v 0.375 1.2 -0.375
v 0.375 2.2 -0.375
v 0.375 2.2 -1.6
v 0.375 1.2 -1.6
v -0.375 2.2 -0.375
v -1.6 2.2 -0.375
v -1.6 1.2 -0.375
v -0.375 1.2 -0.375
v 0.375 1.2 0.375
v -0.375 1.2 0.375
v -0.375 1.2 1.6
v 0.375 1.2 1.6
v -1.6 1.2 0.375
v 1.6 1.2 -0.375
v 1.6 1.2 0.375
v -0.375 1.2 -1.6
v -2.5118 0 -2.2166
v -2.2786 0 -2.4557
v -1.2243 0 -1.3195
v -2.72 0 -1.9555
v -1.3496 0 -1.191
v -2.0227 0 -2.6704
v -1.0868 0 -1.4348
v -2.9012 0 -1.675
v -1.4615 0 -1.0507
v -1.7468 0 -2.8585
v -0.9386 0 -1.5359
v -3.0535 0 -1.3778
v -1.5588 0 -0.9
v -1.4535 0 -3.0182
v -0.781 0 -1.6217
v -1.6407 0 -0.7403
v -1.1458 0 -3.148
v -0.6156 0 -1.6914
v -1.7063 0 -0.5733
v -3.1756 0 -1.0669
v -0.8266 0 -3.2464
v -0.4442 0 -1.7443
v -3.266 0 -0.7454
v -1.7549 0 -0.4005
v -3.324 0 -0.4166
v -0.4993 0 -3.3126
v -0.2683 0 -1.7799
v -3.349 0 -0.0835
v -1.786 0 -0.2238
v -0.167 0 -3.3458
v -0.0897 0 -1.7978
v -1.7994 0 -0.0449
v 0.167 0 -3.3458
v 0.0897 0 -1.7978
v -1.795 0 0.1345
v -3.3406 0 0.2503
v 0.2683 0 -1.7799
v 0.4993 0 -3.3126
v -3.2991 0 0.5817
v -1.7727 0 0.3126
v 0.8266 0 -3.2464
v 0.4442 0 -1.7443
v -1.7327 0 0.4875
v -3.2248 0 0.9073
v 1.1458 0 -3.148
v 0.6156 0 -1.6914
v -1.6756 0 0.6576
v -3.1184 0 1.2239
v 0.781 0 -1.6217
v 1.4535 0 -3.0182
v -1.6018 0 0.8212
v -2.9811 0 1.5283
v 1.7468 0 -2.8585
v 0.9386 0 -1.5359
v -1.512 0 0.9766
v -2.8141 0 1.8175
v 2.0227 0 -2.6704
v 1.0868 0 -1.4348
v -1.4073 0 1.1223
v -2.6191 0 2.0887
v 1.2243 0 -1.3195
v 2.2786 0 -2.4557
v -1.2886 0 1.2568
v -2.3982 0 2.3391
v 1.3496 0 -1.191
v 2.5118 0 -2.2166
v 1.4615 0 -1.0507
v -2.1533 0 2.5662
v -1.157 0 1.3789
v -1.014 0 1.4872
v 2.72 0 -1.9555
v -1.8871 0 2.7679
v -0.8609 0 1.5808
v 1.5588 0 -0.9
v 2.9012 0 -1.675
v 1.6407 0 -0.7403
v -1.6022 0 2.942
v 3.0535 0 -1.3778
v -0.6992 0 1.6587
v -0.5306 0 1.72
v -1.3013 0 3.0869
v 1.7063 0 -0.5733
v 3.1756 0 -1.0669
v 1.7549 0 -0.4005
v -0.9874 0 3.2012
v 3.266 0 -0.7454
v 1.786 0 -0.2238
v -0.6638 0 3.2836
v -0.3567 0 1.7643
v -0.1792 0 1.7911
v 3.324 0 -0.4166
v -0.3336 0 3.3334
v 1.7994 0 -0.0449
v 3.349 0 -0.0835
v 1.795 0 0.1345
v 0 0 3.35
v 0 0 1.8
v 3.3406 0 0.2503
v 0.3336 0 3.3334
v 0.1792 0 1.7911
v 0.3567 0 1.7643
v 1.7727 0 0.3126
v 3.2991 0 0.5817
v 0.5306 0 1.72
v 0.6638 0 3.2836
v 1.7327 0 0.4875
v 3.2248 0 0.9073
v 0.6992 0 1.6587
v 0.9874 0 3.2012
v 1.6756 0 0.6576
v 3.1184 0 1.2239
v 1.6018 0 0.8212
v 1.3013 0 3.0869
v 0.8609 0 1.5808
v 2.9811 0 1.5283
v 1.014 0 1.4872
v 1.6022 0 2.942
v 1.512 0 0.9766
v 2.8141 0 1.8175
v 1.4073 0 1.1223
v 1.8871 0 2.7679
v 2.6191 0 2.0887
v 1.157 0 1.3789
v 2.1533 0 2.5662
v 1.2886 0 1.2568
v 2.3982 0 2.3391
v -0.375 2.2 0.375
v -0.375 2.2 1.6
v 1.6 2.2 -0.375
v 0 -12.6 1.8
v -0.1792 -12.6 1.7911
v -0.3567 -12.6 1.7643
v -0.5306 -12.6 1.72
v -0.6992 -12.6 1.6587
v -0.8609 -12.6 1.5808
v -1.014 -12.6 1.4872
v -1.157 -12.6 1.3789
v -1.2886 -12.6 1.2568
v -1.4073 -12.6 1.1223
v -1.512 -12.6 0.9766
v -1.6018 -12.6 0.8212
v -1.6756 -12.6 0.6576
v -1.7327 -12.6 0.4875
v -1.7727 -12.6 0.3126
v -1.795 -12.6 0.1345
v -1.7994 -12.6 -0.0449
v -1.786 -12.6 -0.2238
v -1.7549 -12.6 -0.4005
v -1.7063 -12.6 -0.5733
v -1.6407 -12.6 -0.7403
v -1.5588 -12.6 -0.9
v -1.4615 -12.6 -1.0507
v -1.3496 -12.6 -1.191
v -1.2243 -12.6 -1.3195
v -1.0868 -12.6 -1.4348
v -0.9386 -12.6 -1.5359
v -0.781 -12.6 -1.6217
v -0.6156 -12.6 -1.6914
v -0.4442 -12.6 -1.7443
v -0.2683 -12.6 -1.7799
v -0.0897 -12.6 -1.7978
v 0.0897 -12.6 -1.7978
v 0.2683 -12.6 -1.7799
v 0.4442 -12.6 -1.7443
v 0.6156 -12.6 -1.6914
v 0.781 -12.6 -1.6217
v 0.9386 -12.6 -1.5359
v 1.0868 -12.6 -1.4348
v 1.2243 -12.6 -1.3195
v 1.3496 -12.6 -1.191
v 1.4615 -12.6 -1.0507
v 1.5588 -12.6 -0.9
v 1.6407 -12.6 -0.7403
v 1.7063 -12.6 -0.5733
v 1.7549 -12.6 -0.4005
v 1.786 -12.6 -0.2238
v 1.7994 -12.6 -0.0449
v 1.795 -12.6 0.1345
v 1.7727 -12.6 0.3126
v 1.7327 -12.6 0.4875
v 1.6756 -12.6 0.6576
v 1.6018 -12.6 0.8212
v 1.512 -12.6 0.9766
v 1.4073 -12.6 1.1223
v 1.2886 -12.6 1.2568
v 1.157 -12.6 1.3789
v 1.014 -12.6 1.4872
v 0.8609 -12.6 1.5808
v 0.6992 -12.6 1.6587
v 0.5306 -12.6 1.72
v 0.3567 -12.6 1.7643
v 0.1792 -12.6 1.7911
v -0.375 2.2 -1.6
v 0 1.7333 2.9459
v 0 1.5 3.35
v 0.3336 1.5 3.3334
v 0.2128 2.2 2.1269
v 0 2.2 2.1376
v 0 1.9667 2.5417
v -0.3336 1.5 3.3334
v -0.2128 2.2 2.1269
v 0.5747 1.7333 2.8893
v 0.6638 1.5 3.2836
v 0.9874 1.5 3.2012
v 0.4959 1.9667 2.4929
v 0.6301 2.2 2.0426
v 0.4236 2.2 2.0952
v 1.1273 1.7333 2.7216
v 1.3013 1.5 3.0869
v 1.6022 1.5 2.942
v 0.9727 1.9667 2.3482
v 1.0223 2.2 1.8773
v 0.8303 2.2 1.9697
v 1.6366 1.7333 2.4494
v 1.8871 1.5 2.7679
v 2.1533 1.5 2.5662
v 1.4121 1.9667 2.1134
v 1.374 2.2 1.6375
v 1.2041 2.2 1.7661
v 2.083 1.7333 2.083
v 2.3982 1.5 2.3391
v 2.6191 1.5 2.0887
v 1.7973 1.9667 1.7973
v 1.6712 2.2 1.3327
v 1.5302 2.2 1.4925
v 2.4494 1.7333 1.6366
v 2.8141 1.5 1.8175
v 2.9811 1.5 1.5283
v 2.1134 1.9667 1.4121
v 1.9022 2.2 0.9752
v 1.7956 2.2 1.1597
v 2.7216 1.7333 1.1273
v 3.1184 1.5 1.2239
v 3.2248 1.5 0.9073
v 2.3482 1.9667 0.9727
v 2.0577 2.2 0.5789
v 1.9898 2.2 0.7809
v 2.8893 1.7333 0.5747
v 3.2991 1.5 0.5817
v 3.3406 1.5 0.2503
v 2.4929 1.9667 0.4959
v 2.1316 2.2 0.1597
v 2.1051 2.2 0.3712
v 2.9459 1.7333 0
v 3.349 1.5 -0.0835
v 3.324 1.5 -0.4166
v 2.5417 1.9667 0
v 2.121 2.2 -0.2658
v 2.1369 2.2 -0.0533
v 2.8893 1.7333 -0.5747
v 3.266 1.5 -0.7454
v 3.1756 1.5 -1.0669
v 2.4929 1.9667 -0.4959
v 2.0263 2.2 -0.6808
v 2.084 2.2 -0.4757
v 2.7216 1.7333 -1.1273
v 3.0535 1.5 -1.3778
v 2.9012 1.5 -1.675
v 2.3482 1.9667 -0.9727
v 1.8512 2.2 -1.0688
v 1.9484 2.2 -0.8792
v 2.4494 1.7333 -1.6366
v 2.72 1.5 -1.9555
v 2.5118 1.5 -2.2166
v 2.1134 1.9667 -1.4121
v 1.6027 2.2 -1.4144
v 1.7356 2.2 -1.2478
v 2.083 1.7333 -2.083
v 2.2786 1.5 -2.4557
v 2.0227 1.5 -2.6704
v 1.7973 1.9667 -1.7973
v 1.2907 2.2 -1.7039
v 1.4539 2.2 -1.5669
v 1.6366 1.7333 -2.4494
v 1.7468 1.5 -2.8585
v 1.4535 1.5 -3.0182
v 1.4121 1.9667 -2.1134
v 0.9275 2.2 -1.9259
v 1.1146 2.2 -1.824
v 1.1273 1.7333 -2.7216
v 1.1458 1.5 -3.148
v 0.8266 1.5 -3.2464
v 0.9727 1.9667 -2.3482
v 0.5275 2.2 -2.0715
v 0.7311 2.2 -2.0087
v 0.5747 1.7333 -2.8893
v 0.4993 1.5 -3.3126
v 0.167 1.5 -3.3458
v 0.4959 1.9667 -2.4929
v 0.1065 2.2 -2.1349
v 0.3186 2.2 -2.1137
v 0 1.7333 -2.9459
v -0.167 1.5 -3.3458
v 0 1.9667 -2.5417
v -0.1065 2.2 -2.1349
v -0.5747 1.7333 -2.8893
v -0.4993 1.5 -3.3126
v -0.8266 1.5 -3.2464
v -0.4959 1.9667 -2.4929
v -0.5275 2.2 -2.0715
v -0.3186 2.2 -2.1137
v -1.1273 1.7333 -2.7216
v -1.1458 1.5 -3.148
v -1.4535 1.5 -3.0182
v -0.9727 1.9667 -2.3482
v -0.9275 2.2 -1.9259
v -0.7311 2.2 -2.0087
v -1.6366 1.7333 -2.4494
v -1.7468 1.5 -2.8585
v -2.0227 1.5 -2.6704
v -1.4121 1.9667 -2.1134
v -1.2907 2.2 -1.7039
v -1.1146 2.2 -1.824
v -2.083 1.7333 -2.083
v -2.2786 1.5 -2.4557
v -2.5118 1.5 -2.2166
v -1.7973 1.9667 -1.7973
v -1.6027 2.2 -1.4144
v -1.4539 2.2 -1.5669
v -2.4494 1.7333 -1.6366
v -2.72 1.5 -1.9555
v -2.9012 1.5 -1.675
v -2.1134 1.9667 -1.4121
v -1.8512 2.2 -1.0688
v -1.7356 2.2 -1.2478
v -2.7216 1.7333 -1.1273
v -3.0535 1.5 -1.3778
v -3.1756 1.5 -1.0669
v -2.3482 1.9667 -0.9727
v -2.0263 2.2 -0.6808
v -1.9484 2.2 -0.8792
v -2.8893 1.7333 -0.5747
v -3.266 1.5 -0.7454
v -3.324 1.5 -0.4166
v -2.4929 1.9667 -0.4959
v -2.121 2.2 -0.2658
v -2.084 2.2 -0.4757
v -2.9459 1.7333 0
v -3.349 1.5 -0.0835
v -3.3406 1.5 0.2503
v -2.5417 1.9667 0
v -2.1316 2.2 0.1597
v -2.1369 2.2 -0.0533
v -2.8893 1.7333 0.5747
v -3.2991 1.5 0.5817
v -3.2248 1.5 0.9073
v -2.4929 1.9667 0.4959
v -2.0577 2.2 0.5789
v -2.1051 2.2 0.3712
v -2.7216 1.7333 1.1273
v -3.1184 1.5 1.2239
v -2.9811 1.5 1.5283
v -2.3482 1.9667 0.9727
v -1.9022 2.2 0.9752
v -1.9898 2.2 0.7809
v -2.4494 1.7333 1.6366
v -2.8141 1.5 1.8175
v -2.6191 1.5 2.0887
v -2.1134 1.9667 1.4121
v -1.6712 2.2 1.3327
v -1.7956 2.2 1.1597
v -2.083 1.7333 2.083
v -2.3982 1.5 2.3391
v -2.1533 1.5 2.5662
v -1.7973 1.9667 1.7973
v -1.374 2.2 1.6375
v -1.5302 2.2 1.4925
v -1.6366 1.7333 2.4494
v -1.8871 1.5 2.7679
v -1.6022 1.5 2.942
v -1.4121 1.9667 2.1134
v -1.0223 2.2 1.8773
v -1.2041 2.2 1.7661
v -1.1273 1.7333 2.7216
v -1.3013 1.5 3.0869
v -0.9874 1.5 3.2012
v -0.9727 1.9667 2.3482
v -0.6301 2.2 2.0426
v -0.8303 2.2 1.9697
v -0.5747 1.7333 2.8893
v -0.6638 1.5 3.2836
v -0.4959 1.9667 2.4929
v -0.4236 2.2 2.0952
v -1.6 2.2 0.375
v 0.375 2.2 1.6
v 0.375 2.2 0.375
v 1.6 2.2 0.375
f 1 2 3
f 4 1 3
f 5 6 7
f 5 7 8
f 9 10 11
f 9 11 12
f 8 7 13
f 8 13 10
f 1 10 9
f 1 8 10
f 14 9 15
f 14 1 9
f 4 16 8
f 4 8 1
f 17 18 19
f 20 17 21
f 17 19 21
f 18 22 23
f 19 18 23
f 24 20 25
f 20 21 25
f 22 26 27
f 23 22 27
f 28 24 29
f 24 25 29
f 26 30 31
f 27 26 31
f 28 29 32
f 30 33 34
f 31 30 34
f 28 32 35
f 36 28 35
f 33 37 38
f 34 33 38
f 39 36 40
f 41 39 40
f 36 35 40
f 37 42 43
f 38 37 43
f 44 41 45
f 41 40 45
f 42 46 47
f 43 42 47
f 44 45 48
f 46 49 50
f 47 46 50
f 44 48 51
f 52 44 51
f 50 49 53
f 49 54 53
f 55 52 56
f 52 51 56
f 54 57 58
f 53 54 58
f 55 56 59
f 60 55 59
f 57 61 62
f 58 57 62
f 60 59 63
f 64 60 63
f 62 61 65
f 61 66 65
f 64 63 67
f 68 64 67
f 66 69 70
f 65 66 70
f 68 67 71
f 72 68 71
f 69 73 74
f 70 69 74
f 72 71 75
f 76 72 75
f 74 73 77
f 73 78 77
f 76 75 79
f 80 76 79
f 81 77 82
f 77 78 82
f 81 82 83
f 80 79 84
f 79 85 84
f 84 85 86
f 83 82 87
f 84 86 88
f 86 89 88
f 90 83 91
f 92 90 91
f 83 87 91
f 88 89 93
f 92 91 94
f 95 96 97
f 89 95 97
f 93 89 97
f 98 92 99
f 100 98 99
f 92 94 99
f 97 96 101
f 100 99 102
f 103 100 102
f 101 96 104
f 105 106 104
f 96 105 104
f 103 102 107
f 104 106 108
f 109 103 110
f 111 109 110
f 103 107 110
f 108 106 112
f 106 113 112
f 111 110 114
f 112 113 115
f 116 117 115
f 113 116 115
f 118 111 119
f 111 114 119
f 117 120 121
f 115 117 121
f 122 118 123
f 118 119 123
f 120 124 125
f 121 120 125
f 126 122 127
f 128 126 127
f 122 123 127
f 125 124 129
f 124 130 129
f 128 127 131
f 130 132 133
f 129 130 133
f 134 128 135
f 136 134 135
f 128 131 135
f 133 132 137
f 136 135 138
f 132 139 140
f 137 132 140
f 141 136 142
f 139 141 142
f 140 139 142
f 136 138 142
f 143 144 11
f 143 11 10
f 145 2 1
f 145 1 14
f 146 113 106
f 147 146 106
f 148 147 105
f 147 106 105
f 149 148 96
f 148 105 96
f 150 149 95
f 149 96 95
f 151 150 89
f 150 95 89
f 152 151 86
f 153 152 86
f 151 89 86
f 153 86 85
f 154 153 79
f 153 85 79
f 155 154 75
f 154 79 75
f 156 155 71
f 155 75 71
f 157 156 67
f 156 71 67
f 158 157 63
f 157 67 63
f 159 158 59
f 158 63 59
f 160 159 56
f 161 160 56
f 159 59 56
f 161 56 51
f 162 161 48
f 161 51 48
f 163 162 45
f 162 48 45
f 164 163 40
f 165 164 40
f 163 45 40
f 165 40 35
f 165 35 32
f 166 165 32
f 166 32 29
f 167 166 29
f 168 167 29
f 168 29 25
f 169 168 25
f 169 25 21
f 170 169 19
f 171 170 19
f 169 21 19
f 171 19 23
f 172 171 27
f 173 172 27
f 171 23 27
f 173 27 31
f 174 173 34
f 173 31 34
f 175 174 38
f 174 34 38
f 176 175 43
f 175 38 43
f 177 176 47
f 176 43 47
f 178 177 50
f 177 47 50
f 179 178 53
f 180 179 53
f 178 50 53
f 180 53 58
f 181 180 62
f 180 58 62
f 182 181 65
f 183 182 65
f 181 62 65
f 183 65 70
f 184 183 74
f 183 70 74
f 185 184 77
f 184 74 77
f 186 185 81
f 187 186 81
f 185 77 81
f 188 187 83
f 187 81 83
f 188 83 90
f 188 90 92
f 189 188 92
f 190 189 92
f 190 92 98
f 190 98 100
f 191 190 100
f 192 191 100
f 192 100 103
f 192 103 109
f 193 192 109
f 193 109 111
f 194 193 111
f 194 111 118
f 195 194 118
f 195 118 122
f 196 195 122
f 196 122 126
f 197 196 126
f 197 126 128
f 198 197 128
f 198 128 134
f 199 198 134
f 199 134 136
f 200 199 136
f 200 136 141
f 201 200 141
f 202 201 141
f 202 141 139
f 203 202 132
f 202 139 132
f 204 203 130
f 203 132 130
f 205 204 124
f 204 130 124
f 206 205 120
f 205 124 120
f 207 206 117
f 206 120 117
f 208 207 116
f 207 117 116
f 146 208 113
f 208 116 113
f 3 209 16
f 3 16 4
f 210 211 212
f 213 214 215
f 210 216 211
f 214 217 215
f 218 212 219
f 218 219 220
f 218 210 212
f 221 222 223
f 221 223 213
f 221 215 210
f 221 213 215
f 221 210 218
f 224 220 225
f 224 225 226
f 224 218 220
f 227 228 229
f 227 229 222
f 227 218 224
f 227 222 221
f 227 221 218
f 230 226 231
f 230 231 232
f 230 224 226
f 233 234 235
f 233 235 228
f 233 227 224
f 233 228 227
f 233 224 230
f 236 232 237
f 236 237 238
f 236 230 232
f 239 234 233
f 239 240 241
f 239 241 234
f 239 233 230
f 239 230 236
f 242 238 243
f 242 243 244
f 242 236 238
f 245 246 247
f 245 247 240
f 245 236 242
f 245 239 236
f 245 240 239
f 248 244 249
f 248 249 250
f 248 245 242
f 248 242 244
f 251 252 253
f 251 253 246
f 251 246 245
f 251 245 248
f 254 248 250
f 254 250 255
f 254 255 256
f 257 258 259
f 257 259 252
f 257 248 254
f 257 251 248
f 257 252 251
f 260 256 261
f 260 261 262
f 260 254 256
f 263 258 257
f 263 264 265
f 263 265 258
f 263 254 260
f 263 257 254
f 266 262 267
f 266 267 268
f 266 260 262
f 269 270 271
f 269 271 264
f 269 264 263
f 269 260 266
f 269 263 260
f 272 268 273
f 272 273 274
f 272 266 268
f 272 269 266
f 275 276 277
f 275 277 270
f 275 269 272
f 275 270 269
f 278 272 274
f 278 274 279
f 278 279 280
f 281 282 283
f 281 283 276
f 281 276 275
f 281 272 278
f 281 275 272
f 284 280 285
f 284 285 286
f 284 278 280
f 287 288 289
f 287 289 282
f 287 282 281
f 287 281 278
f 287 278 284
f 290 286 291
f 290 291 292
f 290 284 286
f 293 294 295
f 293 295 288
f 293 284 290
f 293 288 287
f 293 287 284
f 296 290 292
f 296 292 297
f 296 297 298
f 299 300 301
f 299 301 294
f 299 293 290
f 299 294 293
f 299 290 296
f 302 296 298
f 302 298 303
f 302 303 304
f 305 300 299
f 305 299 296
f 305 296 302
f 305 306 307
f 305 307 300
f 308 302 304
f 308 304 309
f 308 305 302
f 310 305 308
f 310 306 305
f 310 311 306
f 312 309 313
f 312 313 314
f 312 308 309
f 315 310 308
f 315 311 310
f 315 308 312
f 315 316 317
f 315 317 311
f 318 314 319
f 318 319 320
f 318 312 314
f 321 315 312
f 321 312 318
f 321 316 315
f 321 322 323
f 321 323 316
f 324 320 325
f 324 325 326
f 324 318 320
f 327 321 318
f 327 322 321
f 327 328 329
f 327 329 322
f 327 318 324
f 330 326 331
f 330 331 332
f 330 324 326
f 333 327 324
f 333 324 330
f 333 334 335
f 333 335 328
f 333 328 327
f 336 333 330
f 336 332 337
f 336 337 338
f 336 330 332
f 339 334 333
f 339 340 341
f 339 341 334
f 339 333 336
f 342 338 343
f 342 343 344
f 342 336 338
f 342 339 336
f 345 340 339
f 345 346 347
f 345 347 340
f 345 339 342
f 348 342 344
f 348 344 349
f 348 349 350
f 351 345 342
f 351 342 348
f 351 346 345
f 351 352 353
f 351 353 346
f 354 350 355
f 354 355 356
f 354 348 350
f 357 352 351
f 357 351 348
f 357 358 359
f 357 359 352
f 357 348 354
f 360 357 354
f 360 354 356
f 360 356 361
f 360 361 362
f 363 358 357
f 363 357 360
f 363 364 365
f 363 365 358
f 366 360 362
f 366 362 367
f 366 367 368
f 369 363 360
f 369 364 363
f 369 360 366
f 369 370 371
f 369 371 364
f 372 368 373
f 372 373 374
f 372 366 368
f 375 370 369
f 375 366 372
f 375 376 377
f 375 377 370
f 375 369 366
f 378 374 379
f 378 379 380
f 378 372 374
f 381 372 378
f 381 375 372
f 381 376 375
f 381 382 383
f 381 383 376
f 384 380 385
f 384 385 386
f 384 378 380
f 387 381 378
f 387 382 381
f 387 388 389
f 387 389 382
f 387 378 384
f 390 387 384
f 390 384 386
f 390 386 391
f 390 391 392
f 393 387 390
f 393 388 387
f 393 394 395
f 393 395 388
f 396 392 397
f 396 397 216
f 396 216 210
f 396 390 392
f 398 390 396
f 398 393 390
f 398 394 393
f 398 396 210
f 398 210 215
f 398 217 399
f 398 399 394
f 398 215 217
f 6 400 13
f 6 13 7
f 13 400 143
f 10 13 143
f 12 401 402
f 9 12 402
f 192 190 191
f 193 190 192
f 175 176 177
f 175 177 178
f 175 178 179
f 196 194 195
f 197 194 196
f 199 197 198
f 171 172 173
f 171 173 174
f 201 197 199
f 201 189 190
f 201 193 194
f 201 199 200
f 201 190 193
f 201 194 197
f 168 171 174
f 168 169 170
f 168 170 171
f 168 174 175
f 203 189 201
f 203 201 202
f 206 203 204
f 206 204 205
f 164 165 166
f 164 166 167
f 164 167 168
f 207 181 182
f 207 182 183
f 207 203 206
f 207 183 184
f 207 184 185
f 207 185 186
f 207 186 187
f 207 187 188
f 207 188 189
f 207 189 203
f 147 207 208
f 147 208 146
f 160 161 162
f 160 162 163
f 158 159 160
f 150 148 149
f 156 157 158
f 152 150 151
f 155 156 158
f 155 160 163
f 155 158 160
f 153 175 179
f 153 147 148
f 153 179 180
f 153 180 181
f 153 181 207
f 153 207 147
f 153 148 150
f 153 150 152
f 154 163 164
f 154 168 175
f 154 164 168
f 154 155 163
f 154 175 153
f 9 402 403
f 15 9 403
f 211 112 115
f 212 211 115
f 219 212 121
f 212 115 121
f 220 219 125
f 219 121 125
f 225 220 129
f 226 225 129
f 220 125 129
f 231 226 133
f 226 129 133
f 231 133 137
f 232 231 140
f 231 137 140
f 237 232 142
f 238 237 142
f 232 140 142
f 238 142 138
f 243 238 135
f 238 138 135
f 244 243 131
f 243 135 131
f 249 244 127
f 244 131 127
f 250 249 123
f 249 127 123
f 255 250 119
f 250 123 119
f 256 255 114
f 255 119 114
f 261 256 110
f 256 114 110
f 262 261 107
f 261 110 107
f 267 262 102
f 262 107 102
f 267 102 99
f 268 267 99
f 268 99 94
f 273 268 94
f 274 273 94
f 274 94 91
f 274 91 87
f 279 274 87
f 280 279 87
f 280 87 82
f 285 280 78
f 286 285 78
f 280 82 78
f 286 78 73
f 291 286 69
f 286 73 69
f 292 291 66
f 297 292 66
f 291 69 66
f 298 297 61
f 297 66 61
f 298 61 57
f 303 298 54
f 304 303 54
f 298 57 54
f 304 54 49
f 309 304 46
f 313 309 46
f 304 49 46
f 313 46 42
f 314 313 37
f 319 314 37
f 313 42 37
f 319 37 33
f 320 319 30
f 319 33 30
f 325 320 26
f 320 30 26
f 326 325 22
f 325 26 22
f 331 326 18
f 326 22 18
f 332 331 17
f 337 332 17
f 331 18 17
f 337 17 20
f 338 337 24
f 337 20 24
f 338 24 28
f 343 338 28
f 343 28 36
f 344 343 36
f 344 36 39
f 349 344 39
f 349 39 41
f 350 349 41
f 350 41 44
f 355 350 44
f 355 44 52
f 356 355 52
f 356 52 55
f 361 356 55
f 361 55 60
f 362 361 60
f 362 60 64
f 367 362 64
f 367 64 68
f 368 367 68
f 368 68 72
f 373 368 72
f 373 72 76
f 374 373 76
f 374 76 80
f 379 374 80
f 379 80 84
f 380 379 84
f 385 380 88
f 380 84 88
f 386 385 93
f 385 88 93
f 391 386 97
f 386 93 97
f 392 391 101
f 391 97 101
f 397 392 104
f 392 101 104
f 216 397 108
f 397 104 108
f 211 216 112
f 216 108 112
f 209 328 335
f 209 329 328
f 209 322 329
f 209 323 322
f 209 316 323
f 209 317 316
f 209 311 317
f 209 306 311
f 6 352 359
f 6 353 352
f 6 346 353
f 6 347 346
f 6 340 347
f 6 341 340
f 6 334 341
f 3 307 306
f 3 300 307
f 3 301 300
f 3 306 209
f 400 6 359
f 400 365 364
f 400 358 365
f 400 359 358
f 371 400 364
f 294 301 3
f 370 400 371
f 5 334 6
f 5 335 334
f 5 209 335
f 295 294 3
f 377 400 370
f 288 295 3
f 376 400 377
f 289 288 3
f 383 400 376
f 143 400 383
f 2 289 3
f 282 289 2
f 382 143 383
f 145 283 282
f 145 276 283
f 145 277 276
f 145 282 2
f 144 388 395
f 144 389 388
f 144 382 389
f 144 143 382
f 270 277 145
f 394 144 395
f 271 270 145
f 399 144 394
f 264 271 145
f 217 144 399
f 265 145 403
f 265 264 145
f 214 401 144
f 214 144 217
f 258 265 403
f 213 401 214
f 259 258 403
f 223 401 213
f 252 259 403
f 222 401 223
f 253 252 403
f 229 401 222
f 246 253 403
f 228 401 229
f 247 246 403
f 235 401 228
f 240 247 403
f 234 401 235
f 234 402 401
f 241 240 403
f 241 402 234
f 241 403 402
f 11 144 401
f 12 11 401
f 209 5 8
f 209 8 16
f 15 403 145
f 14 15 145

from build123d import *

# Parameters (mm, degrees)
SKETCH1_R           = 3.35
BOSS_EXTRUDE1_DEPTH = 1.5
SKETCH2_R           = 3.35
BOSS_EXTRUDE2_DEPTH = 0.7
BOSS_EXTRUDE2_TAPER = 60
SKETCH3_W           = 1.225
SKETCH3_H           = 0.75
SKETCH3_W_2         = 0.75
SKETCH3_H_2         = 1.225
CUT_EXTRUDE1_DEPTH  = 1
SKETCH4_R           = 1.8
BOSS_EXTRUDE3_DEPTH = 12.6


with BuildPart() as part:
    # Sketch1 → Boss-Extrude1 (new body)
    with BuildSketch(Plane(origin=(0, 0, 0), x_dir=(1, 0, 0), z_dir=(0, 1, 0))):
        with Locations(Location((0, 0, 0), (0, 0, 270))):
            Circle(SKETCH1_R)
    extrude(amount=BOSS_EXTRUDE1_DEPTH)

    # Sketch2 → Boss-Extrude2 (add)
    with BuildSketch(Plane(origin=(0, 1.5, 0), x_dir=(1, 0, 0), z_dir=(0, 1, 0))):
        with Locations(Location((0, 0, 0), (0, 0, 270))):
            Circle(SKETCH2_R)
    extrude(amount=BOSS_EXTRUDE2_DEPTH, taper=BOSS_EXTRUDE2_TAPER)

    # Sketch3 → Cut-Extrude1 (cut)
    with BuildSketch(Plane(origin=(0, 2.2, 0), x_dir=(1, 0, 0), z_dir=(0, 1, 0))):
        with Locations((-0.9875, 0)):
            Rectangle(SKETCH3_W, SKETCH3_H)
        with Locations((0, 0.9875)):
            Rectangle(SKETCH3_W_2, SKETCH3_H_2)
        with Locations((0.9875, 0)):
            Rectangle(SKETCH3_W, SKETCH3_H)
        with Locations((0, -0.9875)):
            Rectangle(SKETCH3_W_2, SKETCH3_H_2)
        Rectangle(SKETCH3_W_2, SKETCH3_H)
    extrude(amount=-CUT_EXTRUDE1_DEPTH, mode=Mode.SUBTRACT)

    # Sketch4 → Boss-Extrude3 (add)
    with BuildSketch(Plane.XZ):
        with Locations(Location((0, 0, 0), (0, 0, 90))):
            Circle(SKETCH4_R)
    extrude(amount=BOSS_EXTRUDE3_DEPTH)


solid = part.part
